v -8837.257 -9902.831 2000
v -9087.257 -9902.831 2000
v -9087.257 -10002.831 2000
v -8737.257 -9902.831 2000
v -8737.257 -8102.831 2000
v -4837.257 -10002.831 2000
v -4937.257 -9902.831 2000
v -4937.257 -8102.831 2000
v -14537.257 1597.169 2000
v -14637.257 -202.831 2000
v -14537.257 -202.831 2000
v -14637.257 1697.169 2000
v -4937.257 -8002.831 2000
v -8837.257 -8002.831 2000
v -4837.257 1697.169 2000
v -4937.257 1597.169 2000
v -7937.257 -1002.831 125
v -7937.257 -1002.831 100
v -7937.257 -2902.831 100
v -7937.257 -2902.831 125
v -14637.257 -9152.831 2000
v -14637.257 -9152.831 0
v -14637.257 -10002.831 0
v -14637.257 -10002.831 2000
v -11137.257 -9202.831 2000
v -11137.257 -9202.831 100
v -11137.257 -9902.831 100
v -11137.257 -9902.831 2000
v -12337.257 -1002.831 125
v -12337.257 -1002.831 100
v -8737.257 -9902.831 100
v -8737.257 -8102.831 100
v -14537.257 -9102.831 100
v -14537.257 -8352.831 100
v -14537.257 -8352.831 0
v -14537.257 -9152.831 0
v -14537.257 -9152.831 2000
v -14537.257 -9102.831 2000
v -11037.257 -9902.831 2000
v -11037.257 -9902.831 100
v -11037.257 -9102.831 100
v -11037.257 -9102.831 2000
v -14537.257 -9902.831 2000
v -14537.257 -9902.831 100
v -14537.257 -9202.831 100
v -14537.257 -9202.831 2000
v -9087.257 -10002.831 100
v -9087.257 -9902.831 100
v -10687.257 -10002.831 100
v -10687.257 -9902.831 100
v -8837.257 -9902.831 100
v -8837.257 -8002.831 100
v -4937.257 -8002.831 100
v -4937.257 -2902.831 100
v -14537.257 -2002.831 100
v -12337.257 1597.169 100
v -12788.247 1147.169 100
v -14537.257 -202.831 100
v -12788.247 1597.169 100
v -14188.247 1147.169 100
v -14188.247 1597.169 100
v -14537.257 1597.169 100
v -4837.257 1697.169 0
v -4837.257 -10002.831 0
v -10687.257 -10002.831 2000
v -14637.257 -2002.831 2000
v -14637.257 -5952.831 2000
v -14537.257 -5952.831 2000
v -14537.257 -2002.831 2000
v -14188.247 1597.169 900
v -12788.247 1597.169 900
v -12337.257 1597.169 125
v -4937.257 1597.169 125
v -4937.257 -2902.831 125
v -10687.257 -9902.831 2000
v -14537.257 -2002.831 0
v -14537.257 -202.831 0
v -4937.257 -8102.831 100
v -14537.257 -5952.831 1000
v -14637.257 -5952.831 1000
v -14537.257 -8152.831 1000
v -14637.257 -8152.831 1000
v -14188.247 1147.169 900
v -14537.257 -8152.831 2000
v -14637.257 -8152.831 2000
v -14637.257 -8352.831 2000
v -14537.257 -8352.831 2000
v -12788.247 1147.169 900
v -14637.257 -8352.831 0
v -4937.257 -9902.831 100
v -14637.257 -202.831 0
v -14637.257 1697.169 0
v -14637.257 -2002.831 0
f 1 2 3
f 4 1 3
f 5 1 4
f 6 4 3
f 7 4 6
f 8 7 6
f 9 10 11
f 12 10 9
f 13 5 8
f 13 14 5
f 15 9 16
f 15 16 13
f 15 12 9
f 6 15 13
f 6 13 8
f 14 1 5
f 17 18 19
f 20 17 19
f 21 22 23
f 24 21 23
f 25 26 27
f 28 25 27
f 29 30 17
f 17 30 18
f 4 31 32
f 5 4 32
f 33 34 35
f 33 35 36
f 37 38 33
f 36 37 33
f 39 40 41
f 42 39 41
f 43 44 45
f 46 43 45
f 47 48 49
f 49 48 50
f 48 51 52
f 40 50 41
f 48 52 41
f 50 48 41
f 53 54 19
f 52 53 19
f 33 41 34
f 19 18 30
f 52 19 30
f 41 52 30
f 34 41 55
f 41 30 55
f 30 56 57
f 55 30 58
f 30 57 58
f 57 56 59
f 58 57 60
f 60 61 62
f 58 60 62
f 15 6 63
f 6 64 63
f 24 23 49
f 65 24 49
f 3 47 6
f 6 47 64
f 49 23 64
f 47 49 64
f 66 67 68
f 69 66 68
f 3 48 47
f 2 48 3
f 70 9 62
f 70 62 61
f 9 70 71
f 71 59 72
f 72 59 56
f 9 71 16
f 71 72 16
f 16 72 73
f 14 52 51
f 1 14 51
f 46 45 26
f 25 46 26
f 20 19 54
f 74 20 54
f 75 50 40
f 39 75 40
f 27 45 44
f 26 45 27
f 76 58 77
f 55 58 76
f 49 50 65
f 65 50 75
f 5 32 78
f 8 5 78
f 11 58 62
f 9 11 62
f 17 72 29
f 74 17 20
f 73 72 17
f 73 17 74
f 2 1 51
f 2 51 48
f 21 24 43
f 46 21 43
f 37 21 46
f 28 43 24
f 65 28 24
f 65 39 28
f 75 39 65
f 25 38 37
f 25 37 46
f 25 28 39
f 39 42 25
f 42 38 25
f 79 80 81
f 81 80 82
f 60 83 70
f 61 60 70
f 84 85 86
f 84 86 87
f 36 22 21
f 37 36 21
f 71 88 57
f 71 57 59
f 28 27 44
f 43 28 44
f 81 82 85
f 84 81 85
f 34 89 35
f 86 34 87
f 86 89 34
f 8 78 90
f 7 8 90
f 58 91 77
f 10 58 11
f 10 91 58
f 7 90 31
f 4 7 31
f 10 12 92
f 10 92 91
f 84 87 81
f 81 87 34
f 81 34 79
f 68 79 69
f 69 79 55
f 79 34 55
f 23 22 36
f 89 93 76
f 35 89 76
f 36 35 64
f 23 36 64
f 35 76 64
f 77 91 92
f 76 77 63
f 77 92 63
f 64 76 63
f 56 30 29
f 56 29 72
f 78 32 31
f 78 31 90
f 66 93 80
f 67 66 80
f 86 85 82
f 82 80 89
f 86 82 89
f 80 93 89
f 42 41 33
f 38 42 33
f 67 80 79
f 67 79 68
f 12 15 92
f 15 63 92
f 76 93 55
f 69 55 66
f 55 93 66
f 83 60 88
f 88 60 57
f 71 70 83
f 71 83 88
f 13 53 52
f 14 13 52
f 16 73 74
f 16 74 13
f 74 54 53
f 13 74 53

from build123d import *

# Parameters (mm, degrees)
F1_DEPTH  = 100
F2_W      = 100
F2_H      = 100
F3_DEPTH  = 1900
F5_DEPTH  = 1900
F6_W      = 1800
F6_H      = 2000
F6_W_2    = 800
F6_W_3    = 2200
F6_H_2    = 1000
F7_DEPTH  = 100
F8_W      = 1600
F8_H      = 2000
F9_DEPTH  = 100
F10_W     = 4400
F10_H     = 2600
F11_DEPTH = 25
F12_W     = 1400
F12_H     = 450
F13_DEPTH = 800


with BuildPart() as f1:
    # F0 (on Top) → F1 (new body)
    with BuildSketch(Plane.XY):
        Polygon((-4837.257402, 1697.169105), (-14637.257402, 1697.169105), (-14637.257402, -9202.830895), (-14637.257402, -10002.830895), (-11137.257402, -10002.830895), (-8937.257402, -10002.830895), (-4837.257402, -10002.830895), (-4837.257402, -8102.830895), align=None)
    extrude(amount=F1_DEPTH)

    # F2 (on face) → F3 (join)
    with BuildSketch(Plane.XY.offset(100)):
        Polygon((-14637.257402, -9902.830895), (-14637.257402, -10002.830895), (-10890.719414, -10002.830895), (-8666.100502, -10002.830895), (-4937.257402, -10002.830895), (-4937.257402, -9902.830895), (-9037.257402, -9902.830895), (-11037.257402, -9902.830895), (-14537.257402, -9902.830895), align=None)
        Polygon((-14637.257402, -9155.583382), (-14637.257402, -9902.830895), (-14537.257402, -9902.830895), (-14537.257402, -8902.830895), (-14537.257402, 1597.169105), (-14637.257402, 1597.169105), (-14637.257402, -8609.960254), align=None)
        with Locations((-4887.257402, -9952.830895)):
            Rectangle(F2_W, F2_H)
        Polygon((-4937.257402, -8002.830895), (-4937.257402, -9902.830895), (-4837.257402, -9902.830895), (-4837.257402, -7690.302372), (-4837.257402, -7344.679244), (-4837.257402, 1597.169105), (-4937.257402, 1597.169105), align=None)
        Polygon((-14637.257402, 1697.169105), (-14637.257402, 1597.169105), (-14537.257402, 1597.169105), (-5037.257402, 1597.169105), (-4937.257402, 1597.169105), (-4837.257402, 1597.169105), (-4837.257402, 1697.169105), align=None)
    extrude(amount=F3_DEPTH)

    # F4 (on face) → F5 (join)
    with BuildSketch(Plane.XY.offset(100)):
        Polygon((-11137.257402, -9902.830895), (-11037.257402, -9902.830895), (-11037.257402, -9102.830895), (-11137.257402, -9102.830895), (-14537.257402, -9102.830895), (-14537.257402, -9202.830895), (-11137.257402, -9202.830895), align=None)
        Polygon((-8737.257402, -8002.830895), (-8837.257402, -8002.830895), (-8837.257402, -8102.830895), (-8837.257402, -9902.830895), (-8737.257402, -9902.830895), (-8737.257402, -8102.830895), (-4937.257402, -8102.830895), (-4937.257402, -8002.830895), align=None)
    extrude(amount=F5_DEPTH)

    # F6 (on face) → F7 (cut)
    with BuildSketch(Plane(origin=(-14637.257402, 0, 0), x_dir=(0, -1, 0), z_dir=(-1, 0, 0))):
        with Locations((1102.830895, 1000)):
            Rectangle(F6_W, F6_H)
        with Locations((8752.830895, 1000)):
            Rectangle(F6_W_2, F6_H)
        with Locations((7052.830895, 1500)):
            Rectangle(F6_W_3, F6_H_2)
    extrude(amount=-F7_DEPTH, mode=Mode.SUBTRACT)

    # F8 (on face) → F9 (cut)
    with BuildSketch(Plane(origin=(0, -9902.830895, 0), x_dir=(-1, 0, 0), z_dir=(0, 1, 0))):
        with Locations((9887.257402, 1100)):
            Rectangle(F8_W, F8_H)
    extrude(amount=-F9_DEPTH, mode=Mode.SUBTRACT)

    # F10 (on face) → F11 (join)
    with BuildSketch(Plane.XY.offset(100)):
        with Locations((-10137.257402, 297.169105)):
            Rectangle(F10_W, F10_H)
        Polygon((-4937.257402, 1597.169105), (-7937.257402, 1597.169105), (-7937.257402, -1002.830895), (-7937.257402, -2902.830895), (-4937.257402, -2902.830895), align=None)
    extrude(amount=F11_DEPTH)

    # F12 (on face) → F13 (join)
    with BuildSketch(Plane.XY.offset(100)):
        with Locations((-13488.246727, 1372.169105)):
            Rectangle(F12_W, F12_H)
    extrude(amount=F13_DEPTH)


solid = f1.part
